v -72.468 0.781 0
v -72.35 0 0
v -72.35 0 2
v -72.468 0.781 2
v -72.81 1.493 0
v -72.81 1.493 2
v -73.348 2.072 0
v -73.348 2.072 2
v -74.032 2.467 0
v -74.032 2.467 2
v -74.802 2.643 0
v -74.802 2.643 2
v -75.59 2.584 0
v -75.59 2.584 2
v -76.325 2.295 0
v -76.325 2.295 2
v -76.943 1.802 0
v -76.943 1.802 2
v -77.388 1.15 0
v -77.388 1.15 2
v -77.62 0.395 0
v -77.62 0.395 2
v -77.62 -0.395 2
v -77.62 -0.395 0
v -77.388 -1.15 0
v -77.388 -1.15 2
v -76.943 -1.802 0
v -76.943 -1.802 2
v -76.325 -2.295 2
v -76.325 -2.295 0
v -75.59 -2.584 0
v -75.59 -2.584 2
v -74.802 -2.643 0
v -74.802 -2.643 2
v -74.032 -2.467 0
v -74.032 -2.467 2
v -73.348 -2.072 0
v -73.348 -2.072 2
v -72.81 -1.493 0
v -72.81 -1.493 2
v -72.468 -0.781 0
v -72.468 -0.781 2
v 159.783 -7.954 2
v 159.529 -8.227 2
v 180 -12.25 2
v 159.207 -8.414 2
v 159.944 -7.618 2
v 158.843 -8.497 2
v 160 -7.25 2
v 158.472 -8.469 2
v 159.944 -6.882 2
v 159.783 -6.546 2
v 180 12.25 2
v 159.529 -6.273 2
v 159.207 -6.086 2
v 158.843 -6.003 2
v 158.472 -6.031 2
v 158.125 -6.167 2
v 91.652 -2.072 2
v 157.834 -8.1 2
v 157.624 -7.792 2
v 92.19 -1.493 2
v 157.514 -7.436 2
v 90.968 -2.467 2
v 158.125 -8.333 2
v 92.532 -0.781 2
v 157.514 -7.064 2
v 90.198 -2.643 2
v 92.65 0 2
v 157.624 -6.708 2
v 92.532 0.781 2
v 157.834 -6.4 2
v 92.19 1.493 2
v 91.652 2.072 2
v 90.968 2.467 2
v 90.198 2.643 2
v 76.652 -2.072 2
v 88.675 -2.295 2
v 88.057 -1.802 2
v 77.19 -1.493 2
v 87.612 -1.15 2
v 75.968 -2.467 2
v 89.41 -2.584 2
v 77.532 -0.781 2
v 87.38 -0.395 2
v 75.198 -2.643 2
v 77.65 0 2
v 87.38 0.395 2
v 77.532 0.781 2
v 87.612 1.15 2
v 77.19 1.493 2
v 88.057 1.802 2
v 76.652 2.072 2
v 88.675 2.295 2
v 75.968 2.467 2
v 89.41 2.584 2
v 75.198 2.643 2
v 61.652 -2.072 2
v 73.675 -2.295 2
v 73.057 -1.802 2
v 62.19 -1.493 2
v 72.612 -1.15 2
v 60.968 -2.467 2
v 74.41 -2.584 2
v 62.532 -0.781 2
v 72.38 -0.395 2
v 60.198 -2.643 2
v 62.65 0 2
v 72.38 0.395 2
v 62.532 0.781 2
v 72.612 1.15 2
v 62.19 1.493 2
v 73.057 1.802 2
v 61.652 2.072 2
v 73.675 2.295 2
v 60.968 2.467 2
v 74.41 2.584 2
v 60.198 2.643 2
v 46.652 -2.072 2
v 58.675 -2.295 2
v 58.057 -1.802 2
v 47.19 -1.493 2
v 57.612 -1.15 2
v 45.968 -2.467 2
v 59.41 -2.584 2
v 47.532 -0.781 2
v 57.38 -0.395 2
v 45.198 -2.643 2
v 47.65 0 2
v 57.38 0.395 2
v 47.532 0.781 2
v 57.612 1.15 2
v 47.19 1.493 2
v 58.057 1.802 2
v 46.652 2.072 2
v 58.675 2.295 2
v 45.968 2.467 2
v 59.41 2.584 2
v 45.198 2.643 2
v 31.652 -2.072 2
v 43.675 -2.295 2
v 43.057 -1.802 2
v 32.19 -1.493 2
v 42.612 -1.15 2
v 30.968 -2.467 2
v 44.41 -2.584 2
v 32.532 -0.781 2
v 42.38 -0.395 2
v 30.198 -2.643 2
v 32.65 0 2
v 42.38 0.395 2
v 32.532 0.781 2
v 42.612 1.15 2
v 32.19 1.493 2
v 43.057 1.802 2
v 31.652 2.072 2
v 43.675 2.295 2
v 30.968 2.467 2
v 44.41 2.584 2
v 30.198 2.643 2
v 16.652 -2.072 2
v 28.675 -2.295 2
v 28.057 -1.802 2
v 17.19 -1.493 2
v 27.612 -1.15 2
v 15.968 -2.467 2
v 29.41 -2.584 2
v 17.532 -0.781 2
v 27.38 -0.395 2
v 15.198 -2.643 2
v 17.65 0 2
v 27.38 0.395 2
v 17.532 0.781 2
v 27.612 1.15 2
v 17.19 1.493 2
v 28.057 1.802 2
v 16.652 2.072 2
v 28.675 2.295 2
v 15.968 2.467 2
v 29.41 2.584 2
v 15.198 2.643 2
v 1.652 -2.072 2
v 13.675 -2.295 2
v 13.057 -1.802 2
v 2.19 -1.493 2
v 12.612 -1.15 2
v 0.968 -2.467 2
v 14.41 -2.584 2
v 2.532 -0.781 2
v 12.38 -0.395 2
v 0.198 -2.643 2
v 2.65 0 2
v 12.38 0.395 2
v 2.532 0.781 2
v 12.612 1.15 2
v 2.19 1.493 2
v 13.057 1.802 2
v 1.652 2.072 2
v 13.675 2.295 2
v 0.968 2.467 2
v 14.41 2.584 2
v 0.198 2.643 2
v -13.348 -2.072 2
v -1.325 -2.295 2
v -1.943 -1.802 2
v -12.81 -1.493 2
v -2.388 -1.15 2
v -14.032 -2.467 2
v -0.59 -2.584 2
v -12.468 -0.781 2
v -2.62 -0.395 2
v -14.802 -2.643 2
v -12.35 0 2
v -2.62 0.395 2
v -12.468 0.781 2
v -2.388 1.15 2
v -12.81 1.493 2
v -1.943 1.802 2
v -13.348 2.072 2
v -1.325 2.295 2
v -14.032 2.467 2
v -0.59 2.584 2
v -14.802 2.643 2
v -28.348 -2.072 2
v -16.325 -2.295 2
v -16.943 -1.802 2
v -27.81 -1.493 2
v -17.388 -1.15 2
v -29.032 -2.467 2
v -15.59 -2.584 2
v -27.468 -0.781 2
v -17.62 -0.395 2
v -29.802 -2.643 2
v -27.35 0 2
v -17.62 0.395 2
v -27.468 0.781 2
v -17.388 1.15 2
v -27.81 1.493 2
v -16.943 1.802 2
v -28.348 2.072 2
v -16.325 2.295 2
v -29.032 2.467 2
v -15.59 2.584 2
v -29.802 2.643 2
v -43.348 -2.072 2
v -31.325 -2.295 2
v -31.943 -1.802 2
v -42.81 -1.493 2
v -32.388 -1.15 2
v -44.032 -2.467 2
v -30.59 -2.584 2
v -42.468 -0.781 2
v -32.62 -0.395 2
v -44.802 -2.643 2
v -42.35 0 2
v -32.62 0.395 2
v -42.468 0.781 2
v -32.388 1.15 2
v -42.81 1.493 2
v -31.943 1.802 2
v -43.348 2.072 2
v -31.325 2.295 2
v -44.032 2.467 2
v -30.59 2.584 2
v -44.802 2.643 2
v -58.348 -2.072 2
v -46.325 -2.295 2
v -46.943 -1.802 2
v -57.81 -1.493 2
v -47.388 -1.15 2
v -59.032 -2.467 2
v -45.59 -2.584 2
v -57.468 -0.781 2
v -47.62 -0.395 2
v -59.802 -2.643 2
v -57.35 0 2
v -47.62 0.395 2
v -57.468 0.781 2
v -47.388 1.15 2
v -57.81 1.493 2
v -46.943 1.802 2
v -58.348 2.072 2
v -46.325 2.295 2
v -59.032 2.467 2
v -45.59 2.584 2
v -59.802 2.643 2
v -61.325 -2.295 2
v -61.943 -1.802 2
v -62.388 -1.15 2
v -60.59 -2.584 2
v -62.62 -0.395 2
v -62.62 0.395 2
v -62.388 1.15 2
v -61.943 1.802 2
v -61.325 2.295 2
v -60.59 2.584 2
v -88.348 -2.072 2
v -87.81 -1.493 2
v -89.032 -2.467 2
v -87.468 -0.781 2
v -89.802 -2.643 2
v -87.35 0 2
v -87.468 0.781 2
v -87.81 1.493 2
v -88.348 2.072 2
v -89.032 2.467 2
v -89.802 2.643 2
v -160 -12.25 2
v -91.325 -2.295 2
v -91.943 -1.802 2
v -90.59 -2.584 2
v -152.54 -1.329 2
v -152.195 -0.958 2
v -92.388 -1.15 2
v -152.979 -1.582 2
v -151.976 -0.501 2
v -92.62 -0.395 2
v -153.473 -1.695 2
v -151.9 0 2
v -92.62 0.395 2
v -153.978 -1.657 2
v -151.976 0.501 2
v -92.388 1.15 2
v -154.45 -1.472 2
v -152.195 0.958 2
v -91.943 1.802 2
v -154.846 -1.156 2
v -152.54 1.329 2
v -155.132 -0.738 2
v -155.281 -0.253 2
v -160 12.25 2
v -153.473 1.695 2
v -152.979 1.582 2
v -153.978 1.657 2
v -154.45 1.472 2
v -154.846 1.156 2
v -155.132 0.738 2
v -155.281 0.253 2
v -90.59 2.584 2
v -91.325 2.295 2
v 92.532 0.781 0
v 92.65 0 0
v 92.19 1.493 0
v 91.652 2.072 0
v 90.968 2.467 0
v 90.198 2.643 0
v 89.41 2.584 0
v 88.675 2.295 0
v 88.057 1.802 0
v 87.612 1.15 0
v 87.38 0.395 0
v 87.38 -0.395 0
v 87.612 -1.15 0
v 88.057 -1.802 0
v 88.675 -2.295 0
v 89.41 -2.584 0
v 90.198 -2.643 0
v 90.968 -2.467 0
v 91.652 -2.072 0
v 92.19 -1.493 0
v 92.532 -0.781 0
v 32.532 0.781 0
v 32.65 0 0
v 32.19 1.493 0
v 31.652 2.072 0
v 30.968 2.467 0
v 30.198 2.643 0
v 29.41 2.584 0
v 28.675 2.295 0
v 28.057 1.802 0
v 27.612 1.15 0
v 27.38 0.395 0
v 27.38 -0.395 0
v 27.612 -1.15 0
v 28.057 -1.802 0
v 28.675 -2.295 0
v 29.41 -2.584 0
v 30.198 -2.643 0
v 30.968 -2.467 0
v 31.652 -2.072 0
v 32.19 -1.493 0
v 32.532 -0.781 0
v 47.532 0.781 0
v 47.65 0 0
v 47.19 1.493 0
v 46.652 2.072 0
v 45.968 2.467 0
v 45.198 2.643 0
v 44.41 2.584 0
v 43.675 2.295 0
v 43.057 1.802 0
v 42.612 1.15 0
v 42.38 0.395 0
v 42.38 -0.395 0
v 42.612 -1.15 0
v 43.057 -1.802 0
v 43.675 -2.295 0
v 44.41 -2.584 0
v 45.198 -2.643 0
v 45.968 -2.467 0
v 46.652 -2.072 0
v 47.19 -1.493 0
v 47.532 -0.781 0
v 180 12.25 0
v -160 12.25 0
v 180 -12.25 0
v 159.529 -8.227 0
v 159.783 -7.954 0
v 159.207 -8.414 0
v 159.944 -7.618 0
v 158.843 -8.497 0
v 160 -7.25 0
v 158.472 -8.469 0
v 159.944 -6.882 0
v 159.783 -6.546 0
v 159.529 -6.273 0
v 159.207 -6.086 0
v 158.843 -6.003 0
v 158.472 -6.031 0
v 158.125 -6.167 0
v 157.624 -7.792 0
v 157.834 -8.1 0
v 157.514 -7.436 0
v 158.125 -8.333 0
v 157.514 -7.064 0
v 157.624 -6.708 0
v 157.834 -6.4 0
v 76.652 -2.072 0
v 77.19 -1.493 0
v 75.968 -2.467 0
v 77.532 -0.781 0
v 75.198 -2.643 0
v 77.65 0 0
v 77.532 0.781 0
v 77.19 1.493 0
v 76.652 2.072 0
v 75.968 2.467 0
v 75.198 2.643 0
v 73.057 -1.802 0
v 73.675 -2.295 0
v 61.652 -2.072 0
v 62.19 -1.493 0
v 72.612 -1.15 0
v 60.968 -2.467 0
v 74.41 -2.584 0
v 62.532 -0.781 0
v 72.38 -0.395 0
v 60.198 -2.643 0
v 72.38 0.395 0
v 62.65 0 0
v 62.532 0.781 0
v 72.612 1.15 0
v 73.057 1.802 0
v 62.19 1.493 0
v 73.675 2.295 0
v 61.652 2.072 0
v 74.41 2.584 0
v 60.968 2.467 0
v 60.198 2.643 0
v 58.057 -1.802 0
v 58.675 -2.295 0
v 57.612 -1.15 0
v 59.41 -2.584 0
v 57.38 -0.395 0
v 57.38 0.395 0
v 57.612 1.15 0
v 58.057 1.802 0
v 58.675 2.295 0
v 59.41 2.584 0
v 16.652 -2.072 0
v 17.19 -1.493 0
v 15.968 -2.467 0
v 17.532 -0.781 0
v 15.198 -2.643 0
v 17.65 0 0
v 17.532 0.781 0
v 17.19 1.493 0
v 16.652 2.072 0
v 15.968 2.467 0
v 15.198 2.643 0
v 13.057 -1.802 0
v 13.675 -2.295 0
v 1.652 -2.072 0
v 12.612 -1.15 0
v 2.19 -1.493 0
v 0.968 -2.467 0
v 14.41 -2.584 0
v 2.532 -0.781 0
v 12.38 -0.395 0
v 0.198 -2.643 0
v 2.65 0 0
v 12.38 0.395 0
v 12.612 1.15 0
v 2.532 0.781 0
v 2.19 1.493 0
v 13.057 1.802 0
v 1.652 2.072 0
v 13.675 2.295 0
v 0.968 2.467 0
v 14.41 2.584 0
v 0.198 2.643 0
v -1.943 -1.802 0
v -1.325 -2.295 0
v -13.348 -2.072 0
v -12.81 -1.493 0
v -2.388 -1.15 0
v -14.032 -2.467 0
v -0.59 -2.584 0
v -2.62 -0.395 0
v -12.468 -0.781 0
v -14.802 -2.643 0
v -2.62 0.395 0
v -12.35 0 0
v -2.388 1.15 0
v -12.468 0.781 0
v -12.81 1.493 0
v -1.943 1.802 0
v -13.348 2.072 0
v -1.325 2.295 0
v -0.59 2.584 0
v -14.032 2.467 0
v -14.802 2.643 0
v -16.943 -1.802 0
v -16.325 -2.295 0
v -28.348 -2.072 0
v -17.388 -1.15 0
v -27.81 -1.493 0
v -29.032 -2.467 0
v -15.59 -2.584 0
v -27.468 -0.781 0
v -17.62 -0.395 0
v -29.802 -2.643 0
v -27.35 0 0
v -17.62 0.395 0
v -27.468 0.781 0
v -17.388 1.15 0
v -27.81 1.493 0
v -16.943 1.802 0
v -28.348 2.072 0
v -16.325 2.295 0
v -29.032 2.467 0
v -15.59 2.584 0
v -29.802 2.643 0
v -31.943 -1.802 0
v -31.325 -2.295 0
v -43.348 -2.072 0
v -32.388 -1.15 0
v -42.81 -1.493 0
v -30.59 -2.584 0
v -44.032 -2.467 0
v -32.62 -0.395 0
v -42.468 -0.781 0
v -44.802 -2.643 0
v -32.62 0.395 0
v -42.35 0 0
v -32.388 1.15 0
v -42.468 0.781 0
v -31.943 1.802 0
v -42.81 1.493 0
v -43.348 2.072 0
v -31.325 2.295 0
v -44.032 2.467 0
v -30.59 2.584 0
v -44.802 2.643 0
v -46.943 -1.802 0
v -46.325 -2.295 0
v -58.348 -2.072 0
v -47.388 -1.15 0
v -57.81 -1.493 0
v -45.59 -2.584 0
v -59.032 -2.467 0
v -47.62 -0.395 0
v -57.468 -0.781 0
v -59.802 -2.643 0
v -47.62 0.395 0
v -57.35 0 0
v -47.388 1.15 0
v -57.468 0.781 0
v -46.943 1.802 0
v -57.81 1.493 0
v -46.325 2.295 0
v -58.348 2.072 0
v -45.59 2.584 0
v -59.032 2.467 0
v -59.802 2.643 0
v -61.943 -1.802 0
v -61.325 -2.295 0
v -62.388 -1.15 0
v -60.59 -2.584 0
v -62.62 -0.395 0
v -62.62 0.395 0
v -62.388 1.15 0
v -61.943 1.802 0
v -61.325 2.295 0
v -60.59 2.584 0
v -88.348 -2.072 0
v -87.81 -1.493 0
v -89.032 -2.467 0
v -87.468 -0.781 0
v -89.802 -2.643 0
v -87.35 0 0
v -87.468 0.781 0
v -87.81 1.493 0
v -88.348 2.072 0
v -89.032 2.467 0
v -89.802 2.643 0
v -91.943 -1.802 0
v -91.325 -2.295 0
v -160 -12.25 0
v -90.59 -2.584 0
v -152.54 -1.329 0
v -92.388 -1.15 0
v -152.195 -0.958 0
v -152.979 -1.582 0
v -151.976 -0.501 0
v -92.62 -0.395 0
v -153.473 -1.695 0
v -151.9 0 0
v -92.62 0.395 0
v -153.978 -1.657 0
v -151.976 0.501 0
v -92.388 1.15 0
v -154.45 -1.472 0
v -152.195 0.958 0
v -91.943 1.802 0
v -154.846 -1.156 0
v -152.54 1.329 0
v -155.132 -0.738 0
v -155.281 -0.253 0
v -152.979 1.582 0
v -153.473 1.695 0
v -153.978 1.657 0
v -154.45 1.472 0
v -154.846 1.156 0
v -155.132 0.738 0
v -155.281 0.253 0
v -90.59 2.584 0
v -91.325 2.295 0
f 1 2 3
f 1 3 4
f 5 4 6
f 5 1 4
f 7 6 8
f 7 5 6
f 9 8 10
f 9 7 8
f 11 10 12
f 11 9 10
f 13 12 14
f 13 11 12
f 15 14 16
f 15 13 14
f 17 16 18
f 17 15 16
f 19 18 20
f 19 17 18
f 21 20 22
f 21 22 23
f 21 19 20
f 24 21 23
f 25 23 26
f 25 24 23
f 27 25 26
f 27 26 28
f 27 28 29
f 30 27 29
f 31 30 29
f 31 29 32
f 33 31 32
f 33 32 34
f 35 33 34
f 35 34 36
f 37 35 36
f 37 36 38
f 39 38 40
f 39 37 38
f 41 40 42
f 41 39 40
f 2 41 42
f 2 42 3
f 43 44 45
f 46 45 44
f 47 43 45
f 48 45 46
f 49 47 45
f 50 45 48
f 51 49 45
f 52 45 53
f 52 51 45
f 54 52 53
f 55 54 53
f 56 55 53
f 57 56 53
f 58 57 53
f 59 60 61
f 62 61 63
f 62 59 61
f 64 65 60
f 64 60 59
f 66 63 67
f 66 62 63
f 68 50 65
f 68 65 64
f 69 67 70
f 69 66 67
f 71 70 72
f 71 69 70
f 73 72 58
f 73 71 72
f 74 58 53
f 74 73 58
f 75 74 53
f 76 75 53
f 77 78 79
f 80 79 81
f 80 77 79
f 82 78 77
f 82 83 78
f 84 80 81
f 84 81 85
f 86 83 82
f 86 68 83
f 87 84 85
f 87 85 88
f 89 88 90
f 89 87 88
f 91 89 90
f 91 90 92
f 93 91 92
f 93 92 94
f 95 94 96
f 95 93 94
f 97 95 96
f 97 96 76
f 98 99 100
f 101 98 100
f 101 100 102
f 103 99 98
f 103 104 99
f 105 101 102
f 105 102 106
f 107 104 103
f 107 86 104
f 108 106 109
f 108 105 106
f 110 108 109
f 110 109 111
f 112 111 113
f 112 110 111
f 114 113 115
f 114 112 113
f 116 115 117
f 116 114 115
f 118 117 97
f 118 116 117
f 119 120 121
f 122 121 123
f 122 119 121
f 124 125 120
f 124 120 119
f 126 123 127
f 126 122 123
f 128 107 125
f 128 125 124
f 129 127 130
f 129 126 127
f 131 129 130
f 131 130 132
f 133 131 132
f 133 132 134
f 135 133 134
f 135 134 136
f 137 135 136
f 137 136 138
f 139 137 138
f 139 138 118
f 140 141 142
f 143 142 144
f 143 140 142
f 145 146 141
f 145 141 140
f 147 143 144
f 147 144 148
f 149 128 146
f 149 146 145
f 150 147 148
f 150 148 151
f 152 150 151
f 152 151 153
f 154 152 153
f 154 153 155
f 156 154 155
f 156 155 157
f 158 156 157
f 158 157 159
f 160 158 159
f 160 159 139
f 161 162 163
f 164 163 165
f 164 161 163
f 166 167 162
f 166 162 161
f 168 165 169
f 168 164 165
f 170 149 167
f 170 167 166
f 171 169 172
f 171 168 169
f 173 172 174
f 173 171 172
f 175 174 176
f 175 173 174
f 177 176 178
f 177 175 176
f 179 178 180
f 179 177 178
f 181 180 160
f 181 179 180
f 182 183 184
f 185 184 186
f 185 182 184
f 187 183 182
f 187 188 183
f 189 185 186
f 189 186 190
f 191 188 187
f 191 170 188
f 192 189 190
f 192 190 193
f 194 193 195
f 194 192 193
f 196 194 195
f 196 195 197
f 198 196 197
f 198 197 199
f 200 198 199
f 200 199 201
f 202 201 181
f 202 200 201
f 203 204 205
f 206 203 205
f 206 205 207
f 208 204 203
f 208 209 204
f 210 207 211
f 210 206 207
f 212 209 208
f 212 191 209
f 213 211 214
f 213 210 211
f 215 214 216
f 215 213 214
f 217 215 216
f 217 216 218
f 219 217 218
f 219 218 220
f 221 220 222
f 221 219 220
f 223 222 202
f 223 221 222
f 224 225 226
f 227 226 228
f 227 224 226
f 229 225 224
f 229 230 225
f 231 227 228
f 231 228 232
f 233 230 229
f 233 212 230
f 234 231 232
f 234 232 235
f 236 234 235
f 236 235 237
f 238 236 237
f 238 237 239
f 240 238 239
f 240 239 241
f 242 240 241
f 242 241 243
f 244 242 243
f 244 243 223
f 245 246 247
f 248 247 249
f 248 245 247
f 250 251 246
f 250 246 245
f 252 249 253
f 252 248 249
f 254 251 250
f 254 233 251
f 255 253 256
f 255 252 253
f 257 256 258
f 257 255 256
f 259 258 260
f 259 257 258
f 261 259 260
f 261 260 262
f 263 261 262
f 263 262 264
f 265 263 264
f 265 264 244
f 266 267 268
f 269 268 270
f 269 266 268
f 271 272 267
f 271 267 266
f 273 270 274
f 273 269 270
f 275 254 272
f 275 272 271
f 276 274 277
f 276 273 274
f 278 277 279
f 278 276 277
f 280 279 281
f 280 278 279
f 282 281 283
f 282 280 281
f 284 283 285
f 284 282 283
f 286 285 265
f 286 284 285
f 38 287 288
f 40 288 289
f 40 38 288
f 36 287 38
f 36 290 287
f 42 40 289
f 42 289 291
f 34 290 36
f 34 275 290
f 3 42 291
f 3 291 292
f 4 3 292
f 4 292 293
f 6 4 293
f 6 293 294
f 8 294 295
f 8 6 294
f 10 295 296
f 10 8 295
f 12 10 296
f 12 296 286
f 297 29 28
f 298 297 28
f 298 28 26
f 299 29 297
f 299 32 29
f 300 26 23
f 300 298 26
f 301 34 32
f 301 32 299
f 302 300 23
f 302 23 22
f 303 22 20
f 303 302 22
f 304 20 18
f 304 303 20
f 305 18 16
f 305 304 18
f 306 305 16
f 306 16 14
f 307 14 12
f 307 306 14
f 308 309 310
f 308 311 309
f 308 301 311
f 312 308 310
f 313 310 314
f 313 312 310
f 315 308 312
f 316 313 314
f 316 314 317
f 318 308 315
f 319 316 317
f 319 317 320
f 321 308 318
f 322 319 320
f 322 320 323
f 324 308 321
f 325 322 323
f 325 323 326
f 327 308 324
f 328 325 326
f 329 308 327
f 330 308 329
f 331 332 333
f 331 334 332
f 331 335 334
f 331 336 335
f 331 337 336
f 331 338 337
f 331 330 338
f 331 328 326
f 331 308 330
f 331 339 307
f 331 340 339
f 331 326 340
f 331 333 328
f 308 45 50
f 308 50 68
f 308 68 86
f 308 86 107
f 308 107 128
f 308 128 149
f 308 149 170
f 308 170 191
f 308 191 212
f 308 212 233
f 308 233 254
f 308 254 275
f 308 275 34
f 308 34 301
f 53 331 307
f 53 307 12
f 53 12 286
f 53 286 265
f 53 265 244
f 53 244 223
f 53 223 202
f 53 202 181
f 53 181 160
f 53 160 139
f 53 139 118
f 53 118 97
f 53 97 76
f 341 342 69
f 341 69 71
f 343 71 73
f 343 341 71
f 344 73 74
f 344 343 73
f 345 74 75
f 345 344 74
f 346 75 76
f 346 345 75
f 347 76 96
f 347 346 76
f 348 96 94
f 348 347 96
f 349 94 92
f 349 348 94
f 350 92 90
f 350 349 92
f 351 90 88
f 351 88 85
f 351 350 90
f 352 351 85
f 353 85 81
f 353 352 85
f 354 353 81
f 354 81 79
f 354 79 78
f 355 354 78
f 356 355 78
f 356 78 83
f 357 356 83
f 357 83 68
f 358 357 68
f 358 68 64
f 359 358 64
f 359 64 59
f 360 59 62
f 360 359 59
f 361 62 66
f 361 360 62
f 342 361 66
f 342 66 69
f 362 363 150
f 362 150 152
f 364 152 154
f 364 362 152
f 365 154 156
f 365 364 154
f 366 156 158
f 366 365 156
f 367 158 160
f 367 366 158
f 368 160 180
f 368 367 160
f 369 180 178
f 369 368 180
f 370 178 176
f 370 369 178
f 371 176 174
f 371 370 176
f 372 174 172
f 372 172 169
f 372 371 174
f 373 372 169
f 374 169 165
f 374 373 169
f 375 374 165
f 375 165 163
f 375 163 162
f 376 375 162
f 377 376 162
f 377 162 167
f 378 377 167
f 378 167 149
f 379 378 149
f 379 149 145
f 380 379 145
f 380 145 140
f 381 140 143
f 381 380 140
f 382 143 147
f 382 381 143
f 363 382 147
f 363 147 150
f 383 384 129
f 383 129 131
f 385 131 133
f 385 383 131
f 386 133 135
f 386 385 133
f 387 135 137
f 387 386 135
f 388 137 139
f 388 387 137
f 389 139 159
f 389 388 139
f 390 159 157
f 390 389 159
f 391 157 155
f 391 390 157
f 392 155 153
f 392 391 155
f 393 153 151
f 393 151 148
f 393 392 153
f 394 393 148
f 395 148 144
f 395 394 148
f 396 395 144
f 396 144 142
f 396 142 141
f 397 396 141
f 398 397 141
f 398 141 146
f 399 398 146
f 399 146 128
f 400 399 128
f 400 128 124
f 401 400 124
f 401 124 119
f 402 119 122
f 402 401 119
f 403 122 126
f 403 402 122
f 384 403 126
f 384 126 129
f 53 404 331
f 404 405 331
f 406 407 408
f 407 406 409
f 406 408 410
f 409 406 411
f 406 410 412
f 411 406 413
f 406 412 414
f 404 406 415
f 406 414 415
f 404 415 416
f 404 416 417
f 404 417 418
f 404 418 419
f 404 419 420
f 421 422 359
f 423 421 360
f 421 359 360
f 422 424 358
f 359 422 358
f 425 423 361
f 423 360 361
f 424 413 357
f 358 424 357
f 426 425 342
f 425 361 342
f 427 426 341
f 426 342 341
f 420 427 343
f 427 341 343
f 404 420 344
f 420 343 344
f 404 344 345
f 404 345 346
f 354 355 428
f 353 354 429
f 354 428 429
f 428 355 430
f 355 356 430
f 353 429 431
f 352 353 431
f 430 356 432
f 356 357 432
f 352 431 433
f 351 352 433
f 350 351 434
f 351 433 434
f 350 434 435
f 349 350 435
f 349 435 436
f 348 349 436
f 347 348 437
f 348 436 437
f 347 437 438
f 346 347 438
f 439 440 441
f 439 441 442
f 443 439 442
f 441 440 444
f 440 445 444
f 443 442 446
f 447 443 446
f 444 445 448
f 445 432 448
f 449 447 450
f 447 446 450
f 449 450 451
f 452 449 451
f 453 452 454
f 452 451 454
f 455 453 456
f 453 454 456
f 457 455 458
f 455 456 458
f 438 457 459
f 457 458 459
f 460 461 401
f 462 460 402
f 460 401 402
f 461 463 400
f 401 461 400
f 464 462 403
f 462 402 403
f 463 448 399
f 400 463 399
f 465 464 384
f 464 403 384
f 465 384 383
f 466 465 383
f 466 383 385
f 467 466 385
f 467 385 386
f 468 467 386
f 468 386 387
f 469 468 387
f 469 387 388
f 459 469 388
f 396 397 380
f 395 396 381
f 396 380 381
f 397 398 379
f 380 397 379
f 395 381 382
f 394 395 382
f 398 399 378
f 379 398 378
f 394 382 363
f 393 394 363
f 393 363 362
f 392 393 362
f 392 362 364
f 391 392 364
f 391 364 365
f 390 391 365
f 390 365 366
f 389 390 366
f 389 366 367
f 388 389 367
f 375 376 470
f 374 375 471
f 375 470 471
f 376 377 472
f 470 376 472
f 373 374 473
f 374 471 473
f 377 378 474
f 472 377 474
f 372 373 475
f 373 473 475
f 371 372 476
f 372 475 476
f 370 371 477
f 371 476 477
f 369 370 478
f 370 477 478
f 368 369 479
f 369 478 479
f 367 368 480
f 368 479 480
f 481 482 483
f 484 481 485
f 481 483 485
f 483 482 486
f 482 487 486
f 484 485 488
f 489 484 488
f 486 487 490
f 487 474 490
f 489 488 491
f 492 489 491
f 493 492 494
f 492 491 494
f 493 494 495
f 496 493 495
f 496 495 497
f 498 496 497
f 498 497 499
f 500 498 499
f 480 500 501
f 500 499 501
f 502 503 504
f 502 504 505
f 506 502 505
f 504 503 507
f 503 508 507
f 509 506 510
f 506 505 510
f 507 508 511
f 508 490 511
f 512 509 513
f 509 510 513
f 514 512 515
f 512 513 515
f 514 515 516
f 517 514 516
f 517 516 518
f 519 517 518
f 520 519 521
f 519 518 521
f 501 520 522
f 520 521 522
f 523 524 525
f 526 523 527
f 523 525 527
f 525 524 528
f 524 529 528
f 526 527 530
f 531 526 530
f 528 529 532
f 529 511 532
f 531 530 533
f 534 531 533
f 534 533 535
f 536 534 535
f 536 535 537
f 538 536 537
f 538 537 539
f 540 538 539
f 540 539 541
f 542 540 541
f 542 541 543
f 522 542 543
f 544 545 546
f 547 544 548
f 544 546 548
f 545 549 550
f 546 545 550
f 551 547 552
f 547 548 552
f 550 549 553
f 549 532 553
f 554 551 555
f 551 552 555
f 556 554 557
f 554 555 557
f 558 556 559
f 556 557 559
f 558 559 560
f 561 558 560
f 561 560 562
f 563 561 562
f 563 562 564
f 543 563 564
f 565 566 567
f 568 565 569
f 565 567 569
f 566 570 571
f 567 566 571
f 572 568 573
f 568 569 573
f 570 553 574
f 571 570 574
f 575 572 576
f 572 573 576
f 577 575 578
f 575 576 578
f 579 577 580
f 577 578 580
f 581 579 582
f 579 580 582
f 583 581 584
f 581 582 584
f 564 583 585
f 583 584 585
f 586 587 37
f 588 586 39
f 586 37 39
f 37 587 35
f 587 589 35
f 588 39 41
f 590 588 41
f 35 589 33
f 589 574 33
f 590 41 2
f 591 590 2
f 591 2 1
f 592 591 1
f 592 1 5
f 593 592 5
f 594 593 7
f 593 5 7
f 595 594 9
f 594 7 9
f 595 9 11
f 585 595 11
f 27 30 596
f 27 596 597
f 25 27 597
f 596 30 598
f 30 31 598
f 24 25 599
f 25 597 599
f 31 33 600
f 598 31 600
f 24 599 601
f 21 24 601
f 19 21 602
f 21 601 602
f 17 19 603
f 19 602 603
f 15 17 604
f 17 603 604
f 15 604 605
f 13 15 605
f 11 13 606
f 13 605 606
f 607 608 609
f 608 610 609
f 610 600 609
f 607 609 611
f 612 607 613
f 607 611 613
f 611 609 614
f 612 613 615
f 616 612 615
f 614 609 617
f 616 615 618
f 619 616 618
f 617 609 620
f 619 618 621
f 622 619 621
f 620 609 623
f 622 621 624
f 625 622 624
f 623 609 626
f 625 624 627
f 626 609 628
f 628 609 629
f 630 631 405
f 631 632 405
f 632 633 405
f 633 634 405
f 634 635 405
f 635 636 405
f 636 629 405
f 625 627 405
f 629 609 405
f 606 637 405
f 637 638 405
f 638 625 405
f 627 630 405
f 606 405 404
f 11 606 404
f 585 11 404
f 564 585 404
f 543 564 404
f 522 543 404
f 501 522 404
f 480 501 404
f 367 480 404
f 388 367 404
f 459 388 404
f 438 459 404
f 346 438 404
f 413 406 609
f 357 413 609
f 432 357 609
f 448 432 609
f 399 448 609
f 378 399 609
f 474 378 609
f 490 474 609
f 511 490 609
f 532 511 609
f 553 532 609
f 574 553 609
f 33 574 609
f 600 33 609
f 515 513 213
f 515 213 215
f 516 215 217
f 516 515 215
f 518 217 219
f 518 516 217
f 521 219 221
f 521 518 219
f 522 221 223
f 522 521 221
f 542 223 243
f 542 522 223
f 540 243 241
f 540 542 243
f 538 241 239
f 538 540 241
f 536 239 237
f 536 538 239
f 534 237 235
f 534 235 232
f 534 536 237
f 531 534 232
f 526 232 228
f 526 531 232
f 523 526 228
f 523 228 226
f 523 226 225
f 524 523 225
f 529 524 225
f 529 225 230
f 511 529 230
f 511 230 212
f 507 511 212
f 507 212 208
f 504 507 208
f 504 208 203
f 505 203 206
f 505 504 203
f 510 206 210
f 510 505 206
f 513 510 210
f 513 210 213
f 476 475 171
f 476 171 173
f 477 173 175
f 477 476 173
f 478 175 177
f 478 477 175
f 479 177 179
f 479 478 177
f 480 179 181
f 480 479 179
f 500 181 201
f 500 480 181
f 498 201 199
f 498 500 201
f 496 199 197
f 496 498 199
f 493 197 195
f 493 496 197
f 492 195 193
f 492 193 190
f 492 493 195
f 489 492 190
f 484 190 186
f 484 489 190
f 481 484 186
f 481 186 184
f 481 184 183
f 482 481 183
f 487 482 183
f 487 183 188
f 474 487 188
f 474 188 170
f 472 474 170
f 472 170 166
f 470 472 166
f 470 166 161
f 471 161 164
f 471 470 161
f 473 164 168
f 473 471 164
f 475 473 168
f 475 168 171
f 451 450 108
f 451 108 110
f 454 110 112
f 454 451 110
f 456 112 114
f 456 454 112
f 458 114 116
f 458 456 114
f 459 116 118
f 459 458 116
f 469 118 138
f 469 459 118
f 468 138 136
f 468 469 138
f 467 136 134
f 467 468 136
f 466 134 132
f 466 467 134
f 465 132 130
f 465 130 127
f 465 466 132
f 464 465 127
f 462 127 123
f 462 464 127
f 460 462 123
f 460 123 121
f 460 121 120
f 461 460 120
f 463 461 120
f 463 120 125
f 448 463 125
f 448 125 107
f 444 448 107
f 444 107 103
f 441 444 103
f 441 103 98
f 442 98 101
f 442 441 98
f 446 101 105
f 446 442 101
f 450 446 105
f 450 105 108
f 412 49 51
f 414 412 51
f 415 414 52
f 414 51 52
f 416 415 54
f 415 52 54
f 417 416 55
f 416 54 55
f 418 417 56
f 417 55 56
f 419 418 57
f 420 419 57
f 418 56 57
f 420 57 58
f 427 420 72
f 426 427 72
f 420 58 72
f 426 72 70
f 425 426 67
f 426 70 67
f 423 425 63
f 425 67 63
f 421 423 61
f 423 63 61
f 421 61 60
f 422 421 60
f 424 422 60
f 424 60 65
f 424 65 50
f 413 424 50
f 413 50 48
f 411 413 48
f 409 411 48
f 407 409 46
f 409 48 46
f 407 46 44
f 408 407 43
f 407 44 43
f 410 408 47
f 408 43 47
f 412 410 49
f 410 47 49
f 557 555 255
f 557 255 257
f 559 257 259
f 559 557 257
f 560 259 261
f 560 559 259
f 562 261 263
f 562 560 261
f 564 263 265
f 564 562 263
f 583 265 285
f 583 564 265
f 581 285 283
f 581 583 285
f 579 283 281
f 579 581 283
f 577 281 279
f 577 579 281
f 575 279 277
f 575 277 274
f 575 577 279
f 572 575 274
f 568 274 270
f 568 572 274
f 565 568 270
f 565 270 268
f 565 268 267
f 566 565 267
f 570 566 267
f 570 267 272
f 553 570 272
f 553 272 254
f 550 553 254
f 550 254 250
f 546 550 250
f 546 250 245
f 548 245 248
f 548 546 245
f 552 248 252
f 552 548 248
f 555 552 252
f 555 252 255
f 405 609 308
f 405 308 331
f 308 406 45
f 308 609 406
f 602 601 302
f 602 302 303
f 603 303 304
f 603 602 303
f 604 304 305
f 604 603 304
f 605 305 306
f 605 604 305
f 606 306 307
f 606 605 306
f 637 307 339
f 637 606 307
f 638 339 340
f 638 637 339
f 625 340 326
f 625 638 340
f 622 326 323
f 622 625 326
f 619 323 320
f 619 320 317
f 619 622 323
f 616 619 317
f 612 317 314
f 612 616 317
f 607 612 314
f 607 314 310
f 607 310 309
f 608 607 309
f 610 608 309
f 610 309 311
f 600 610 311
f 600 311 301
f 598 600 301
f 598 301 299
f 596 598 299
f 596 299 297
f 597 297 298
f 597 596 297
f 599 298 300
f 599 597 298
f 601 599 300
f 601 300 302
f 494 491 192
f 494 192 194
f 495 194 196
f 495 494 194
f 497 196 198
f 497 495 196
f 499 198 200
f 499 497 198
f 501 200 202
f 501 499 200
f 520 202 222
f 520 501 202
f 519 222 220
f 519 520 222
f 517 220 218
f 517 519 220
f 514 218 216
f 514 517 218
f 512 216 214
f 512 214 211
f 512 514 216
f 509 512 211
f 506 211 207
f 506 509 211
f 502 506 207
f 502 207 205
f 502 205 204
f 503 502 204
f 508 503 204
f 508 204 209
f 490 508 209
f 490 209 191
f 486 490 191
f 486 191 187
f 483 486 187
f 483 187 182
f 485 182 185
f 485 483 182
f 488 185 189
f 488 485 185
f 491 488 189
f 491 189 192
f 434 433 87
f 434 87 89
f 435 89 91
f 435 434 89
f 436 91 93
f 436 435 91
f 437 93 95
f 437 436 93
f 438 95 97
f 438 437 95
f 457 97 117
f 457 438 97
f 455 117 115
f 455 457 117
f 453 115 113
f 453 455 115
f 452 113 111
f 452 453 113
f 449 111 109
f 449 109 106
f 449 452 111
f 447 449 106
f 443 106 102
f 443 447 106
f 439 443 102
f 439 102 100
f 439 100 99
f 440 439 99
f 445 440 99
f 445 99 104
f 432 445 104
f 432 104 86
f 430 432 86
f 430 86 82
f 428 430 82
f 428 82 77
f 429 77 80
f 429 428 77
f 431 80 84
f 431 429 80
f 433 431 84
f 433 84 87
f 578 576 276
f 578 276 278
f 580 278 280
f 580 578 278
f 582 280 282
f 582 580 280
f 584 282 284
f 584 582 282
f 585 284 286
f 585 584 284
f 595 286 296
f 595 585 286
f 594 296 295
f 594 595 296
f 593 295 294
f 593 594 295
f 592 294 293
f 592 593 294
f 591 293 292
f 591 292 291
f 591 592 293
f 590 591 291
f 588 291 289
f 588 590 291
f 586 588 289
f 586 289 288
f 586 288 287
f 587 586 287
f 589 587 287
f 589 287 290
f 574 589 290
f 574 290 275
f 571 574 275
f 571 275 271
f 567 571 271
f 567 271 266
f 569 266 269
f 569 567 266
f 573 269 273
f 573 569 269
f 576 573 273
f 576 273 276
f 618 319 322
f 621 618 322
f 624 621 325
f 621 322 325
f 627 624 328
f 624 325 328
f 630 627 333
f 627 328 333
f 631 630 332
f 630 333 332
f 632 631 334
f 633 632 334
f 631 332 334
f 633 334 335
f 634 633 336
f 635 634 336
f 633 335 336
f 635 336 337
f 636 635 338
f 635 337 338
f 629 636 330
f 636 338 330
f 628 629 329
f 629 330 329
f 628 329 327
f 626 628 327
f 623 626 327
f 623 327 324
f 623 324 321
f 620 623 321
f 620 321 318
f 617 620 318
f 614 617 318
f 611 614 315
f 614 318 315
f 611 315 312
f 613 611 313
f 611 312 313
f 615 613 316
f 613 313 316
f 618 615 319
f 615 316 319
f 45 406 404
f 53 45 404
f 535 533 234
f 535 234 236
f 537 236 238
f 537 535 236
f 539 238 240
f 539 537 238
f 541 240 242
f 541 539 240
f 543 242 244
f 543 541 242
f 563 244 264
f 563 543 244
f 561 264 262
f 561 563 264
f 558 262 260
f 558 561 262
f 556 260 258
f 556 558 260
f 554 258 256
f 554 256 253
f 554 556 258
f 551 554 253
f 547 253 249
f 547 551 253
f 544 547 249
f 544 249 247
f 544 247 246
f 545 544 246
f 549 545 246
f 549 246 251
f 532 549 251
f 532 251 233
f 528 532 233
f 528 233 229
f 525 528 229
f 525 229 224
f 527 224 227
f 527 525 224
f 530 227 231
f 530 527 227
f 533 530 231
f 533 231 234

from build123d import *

# Parameters (mm, degrees)
F0_W     = 300
F0_H     = 24.5
F0_R     = 2.65
F1_DEPTH = 2
F2_DEPTH = 10
F3_DEPTH = 30
F4_R     = 1.7
F5_DEPTH = 2
F6_R     = 1.25
F7_DEPTH = 2


with BuildPart() as f1:
    # F0 (on Top) → F1 (new body)
    with BuildSketch(Plane.XY):
        Rectangle(F0_W, F0_H)
        with Locations((-90, 0)):
            Circle(F0_R, mode=Mode.SUBTRACT)
        with Locations((-75, 0)):
            Circle(F0_R, mode=Mode.SUBTRACT)
        with Locations((-60, 0)):
            Circle(F0_R, mode=Mode.SUBTRACT)
        with Locations((-45, 0)):
            Circle(F0_R, mode=Mode.SUBTRACT)
        with Locations((-30, 0)):
            Circle(F0_R, mode=Mode.SUBTRACT)
        with Locations((-15, 0)):
            Circle(F0_R, mode=Mode.SUBTRACT)
        Circle(F0_R, mode=Mode.SUBTRACT)
        with Locations((15, 0)):
            Circle(F0_R, mode=Mode.SUBTRACT)
        with Locations((30, 0)):
            Circle(F0_R, mode=Mode.SUBTRACT)
        with Locations((45, 0)):
            Circle(F0_R, mode=Mode.SUBTRACT)
        with Locations((60, 0)):
            Circle(F0_R, mode=Mode.SUBTRACT)
        with Locations((75, 0)):
            Circle(F0_R, mode=Mode.SUBTRACT)
        with Locations((90, 0)):
            Circle(F0_R, mode=Mode.SUBTRACT)
    extrude(amount=F1_DEPTH)

    # F2 (add): a face of the model
    f2_faces = [f1.faces().sort_by_distance(p)[0] for p in [
        (-150, 0, 1),
    ]]
    extrude(f2_faces, amount=F2_DEPTH)

    # F3 (add): a face of the model
    f3_faces = [f1.faces().sort_by_distance(p)[0] for p in [
        (150, 0, 1),
    ]]
    extrude(f3_faces, amount=F3_DEPTH)

    # F4 (on face) → F5 (cut, through all)
    with BuildSketch(Plane.XY.offset(2)):
        with Locations((-153.6, 0)):
            Circle(F4_R)
    extrude(amount=-F5_DEPTH, mode=Mode.SUBTRACT)

    # F6 (on face) → F7 (cut, through all)
    with BuildSketch(Plane.XY.offset(2)):
        with Locations((158.75, -7.25)):
            Circle(F6_R)
    extrude(amount=-F7_DEPTH, mode=Mode.SUBTRACT)


solid = f1.part
